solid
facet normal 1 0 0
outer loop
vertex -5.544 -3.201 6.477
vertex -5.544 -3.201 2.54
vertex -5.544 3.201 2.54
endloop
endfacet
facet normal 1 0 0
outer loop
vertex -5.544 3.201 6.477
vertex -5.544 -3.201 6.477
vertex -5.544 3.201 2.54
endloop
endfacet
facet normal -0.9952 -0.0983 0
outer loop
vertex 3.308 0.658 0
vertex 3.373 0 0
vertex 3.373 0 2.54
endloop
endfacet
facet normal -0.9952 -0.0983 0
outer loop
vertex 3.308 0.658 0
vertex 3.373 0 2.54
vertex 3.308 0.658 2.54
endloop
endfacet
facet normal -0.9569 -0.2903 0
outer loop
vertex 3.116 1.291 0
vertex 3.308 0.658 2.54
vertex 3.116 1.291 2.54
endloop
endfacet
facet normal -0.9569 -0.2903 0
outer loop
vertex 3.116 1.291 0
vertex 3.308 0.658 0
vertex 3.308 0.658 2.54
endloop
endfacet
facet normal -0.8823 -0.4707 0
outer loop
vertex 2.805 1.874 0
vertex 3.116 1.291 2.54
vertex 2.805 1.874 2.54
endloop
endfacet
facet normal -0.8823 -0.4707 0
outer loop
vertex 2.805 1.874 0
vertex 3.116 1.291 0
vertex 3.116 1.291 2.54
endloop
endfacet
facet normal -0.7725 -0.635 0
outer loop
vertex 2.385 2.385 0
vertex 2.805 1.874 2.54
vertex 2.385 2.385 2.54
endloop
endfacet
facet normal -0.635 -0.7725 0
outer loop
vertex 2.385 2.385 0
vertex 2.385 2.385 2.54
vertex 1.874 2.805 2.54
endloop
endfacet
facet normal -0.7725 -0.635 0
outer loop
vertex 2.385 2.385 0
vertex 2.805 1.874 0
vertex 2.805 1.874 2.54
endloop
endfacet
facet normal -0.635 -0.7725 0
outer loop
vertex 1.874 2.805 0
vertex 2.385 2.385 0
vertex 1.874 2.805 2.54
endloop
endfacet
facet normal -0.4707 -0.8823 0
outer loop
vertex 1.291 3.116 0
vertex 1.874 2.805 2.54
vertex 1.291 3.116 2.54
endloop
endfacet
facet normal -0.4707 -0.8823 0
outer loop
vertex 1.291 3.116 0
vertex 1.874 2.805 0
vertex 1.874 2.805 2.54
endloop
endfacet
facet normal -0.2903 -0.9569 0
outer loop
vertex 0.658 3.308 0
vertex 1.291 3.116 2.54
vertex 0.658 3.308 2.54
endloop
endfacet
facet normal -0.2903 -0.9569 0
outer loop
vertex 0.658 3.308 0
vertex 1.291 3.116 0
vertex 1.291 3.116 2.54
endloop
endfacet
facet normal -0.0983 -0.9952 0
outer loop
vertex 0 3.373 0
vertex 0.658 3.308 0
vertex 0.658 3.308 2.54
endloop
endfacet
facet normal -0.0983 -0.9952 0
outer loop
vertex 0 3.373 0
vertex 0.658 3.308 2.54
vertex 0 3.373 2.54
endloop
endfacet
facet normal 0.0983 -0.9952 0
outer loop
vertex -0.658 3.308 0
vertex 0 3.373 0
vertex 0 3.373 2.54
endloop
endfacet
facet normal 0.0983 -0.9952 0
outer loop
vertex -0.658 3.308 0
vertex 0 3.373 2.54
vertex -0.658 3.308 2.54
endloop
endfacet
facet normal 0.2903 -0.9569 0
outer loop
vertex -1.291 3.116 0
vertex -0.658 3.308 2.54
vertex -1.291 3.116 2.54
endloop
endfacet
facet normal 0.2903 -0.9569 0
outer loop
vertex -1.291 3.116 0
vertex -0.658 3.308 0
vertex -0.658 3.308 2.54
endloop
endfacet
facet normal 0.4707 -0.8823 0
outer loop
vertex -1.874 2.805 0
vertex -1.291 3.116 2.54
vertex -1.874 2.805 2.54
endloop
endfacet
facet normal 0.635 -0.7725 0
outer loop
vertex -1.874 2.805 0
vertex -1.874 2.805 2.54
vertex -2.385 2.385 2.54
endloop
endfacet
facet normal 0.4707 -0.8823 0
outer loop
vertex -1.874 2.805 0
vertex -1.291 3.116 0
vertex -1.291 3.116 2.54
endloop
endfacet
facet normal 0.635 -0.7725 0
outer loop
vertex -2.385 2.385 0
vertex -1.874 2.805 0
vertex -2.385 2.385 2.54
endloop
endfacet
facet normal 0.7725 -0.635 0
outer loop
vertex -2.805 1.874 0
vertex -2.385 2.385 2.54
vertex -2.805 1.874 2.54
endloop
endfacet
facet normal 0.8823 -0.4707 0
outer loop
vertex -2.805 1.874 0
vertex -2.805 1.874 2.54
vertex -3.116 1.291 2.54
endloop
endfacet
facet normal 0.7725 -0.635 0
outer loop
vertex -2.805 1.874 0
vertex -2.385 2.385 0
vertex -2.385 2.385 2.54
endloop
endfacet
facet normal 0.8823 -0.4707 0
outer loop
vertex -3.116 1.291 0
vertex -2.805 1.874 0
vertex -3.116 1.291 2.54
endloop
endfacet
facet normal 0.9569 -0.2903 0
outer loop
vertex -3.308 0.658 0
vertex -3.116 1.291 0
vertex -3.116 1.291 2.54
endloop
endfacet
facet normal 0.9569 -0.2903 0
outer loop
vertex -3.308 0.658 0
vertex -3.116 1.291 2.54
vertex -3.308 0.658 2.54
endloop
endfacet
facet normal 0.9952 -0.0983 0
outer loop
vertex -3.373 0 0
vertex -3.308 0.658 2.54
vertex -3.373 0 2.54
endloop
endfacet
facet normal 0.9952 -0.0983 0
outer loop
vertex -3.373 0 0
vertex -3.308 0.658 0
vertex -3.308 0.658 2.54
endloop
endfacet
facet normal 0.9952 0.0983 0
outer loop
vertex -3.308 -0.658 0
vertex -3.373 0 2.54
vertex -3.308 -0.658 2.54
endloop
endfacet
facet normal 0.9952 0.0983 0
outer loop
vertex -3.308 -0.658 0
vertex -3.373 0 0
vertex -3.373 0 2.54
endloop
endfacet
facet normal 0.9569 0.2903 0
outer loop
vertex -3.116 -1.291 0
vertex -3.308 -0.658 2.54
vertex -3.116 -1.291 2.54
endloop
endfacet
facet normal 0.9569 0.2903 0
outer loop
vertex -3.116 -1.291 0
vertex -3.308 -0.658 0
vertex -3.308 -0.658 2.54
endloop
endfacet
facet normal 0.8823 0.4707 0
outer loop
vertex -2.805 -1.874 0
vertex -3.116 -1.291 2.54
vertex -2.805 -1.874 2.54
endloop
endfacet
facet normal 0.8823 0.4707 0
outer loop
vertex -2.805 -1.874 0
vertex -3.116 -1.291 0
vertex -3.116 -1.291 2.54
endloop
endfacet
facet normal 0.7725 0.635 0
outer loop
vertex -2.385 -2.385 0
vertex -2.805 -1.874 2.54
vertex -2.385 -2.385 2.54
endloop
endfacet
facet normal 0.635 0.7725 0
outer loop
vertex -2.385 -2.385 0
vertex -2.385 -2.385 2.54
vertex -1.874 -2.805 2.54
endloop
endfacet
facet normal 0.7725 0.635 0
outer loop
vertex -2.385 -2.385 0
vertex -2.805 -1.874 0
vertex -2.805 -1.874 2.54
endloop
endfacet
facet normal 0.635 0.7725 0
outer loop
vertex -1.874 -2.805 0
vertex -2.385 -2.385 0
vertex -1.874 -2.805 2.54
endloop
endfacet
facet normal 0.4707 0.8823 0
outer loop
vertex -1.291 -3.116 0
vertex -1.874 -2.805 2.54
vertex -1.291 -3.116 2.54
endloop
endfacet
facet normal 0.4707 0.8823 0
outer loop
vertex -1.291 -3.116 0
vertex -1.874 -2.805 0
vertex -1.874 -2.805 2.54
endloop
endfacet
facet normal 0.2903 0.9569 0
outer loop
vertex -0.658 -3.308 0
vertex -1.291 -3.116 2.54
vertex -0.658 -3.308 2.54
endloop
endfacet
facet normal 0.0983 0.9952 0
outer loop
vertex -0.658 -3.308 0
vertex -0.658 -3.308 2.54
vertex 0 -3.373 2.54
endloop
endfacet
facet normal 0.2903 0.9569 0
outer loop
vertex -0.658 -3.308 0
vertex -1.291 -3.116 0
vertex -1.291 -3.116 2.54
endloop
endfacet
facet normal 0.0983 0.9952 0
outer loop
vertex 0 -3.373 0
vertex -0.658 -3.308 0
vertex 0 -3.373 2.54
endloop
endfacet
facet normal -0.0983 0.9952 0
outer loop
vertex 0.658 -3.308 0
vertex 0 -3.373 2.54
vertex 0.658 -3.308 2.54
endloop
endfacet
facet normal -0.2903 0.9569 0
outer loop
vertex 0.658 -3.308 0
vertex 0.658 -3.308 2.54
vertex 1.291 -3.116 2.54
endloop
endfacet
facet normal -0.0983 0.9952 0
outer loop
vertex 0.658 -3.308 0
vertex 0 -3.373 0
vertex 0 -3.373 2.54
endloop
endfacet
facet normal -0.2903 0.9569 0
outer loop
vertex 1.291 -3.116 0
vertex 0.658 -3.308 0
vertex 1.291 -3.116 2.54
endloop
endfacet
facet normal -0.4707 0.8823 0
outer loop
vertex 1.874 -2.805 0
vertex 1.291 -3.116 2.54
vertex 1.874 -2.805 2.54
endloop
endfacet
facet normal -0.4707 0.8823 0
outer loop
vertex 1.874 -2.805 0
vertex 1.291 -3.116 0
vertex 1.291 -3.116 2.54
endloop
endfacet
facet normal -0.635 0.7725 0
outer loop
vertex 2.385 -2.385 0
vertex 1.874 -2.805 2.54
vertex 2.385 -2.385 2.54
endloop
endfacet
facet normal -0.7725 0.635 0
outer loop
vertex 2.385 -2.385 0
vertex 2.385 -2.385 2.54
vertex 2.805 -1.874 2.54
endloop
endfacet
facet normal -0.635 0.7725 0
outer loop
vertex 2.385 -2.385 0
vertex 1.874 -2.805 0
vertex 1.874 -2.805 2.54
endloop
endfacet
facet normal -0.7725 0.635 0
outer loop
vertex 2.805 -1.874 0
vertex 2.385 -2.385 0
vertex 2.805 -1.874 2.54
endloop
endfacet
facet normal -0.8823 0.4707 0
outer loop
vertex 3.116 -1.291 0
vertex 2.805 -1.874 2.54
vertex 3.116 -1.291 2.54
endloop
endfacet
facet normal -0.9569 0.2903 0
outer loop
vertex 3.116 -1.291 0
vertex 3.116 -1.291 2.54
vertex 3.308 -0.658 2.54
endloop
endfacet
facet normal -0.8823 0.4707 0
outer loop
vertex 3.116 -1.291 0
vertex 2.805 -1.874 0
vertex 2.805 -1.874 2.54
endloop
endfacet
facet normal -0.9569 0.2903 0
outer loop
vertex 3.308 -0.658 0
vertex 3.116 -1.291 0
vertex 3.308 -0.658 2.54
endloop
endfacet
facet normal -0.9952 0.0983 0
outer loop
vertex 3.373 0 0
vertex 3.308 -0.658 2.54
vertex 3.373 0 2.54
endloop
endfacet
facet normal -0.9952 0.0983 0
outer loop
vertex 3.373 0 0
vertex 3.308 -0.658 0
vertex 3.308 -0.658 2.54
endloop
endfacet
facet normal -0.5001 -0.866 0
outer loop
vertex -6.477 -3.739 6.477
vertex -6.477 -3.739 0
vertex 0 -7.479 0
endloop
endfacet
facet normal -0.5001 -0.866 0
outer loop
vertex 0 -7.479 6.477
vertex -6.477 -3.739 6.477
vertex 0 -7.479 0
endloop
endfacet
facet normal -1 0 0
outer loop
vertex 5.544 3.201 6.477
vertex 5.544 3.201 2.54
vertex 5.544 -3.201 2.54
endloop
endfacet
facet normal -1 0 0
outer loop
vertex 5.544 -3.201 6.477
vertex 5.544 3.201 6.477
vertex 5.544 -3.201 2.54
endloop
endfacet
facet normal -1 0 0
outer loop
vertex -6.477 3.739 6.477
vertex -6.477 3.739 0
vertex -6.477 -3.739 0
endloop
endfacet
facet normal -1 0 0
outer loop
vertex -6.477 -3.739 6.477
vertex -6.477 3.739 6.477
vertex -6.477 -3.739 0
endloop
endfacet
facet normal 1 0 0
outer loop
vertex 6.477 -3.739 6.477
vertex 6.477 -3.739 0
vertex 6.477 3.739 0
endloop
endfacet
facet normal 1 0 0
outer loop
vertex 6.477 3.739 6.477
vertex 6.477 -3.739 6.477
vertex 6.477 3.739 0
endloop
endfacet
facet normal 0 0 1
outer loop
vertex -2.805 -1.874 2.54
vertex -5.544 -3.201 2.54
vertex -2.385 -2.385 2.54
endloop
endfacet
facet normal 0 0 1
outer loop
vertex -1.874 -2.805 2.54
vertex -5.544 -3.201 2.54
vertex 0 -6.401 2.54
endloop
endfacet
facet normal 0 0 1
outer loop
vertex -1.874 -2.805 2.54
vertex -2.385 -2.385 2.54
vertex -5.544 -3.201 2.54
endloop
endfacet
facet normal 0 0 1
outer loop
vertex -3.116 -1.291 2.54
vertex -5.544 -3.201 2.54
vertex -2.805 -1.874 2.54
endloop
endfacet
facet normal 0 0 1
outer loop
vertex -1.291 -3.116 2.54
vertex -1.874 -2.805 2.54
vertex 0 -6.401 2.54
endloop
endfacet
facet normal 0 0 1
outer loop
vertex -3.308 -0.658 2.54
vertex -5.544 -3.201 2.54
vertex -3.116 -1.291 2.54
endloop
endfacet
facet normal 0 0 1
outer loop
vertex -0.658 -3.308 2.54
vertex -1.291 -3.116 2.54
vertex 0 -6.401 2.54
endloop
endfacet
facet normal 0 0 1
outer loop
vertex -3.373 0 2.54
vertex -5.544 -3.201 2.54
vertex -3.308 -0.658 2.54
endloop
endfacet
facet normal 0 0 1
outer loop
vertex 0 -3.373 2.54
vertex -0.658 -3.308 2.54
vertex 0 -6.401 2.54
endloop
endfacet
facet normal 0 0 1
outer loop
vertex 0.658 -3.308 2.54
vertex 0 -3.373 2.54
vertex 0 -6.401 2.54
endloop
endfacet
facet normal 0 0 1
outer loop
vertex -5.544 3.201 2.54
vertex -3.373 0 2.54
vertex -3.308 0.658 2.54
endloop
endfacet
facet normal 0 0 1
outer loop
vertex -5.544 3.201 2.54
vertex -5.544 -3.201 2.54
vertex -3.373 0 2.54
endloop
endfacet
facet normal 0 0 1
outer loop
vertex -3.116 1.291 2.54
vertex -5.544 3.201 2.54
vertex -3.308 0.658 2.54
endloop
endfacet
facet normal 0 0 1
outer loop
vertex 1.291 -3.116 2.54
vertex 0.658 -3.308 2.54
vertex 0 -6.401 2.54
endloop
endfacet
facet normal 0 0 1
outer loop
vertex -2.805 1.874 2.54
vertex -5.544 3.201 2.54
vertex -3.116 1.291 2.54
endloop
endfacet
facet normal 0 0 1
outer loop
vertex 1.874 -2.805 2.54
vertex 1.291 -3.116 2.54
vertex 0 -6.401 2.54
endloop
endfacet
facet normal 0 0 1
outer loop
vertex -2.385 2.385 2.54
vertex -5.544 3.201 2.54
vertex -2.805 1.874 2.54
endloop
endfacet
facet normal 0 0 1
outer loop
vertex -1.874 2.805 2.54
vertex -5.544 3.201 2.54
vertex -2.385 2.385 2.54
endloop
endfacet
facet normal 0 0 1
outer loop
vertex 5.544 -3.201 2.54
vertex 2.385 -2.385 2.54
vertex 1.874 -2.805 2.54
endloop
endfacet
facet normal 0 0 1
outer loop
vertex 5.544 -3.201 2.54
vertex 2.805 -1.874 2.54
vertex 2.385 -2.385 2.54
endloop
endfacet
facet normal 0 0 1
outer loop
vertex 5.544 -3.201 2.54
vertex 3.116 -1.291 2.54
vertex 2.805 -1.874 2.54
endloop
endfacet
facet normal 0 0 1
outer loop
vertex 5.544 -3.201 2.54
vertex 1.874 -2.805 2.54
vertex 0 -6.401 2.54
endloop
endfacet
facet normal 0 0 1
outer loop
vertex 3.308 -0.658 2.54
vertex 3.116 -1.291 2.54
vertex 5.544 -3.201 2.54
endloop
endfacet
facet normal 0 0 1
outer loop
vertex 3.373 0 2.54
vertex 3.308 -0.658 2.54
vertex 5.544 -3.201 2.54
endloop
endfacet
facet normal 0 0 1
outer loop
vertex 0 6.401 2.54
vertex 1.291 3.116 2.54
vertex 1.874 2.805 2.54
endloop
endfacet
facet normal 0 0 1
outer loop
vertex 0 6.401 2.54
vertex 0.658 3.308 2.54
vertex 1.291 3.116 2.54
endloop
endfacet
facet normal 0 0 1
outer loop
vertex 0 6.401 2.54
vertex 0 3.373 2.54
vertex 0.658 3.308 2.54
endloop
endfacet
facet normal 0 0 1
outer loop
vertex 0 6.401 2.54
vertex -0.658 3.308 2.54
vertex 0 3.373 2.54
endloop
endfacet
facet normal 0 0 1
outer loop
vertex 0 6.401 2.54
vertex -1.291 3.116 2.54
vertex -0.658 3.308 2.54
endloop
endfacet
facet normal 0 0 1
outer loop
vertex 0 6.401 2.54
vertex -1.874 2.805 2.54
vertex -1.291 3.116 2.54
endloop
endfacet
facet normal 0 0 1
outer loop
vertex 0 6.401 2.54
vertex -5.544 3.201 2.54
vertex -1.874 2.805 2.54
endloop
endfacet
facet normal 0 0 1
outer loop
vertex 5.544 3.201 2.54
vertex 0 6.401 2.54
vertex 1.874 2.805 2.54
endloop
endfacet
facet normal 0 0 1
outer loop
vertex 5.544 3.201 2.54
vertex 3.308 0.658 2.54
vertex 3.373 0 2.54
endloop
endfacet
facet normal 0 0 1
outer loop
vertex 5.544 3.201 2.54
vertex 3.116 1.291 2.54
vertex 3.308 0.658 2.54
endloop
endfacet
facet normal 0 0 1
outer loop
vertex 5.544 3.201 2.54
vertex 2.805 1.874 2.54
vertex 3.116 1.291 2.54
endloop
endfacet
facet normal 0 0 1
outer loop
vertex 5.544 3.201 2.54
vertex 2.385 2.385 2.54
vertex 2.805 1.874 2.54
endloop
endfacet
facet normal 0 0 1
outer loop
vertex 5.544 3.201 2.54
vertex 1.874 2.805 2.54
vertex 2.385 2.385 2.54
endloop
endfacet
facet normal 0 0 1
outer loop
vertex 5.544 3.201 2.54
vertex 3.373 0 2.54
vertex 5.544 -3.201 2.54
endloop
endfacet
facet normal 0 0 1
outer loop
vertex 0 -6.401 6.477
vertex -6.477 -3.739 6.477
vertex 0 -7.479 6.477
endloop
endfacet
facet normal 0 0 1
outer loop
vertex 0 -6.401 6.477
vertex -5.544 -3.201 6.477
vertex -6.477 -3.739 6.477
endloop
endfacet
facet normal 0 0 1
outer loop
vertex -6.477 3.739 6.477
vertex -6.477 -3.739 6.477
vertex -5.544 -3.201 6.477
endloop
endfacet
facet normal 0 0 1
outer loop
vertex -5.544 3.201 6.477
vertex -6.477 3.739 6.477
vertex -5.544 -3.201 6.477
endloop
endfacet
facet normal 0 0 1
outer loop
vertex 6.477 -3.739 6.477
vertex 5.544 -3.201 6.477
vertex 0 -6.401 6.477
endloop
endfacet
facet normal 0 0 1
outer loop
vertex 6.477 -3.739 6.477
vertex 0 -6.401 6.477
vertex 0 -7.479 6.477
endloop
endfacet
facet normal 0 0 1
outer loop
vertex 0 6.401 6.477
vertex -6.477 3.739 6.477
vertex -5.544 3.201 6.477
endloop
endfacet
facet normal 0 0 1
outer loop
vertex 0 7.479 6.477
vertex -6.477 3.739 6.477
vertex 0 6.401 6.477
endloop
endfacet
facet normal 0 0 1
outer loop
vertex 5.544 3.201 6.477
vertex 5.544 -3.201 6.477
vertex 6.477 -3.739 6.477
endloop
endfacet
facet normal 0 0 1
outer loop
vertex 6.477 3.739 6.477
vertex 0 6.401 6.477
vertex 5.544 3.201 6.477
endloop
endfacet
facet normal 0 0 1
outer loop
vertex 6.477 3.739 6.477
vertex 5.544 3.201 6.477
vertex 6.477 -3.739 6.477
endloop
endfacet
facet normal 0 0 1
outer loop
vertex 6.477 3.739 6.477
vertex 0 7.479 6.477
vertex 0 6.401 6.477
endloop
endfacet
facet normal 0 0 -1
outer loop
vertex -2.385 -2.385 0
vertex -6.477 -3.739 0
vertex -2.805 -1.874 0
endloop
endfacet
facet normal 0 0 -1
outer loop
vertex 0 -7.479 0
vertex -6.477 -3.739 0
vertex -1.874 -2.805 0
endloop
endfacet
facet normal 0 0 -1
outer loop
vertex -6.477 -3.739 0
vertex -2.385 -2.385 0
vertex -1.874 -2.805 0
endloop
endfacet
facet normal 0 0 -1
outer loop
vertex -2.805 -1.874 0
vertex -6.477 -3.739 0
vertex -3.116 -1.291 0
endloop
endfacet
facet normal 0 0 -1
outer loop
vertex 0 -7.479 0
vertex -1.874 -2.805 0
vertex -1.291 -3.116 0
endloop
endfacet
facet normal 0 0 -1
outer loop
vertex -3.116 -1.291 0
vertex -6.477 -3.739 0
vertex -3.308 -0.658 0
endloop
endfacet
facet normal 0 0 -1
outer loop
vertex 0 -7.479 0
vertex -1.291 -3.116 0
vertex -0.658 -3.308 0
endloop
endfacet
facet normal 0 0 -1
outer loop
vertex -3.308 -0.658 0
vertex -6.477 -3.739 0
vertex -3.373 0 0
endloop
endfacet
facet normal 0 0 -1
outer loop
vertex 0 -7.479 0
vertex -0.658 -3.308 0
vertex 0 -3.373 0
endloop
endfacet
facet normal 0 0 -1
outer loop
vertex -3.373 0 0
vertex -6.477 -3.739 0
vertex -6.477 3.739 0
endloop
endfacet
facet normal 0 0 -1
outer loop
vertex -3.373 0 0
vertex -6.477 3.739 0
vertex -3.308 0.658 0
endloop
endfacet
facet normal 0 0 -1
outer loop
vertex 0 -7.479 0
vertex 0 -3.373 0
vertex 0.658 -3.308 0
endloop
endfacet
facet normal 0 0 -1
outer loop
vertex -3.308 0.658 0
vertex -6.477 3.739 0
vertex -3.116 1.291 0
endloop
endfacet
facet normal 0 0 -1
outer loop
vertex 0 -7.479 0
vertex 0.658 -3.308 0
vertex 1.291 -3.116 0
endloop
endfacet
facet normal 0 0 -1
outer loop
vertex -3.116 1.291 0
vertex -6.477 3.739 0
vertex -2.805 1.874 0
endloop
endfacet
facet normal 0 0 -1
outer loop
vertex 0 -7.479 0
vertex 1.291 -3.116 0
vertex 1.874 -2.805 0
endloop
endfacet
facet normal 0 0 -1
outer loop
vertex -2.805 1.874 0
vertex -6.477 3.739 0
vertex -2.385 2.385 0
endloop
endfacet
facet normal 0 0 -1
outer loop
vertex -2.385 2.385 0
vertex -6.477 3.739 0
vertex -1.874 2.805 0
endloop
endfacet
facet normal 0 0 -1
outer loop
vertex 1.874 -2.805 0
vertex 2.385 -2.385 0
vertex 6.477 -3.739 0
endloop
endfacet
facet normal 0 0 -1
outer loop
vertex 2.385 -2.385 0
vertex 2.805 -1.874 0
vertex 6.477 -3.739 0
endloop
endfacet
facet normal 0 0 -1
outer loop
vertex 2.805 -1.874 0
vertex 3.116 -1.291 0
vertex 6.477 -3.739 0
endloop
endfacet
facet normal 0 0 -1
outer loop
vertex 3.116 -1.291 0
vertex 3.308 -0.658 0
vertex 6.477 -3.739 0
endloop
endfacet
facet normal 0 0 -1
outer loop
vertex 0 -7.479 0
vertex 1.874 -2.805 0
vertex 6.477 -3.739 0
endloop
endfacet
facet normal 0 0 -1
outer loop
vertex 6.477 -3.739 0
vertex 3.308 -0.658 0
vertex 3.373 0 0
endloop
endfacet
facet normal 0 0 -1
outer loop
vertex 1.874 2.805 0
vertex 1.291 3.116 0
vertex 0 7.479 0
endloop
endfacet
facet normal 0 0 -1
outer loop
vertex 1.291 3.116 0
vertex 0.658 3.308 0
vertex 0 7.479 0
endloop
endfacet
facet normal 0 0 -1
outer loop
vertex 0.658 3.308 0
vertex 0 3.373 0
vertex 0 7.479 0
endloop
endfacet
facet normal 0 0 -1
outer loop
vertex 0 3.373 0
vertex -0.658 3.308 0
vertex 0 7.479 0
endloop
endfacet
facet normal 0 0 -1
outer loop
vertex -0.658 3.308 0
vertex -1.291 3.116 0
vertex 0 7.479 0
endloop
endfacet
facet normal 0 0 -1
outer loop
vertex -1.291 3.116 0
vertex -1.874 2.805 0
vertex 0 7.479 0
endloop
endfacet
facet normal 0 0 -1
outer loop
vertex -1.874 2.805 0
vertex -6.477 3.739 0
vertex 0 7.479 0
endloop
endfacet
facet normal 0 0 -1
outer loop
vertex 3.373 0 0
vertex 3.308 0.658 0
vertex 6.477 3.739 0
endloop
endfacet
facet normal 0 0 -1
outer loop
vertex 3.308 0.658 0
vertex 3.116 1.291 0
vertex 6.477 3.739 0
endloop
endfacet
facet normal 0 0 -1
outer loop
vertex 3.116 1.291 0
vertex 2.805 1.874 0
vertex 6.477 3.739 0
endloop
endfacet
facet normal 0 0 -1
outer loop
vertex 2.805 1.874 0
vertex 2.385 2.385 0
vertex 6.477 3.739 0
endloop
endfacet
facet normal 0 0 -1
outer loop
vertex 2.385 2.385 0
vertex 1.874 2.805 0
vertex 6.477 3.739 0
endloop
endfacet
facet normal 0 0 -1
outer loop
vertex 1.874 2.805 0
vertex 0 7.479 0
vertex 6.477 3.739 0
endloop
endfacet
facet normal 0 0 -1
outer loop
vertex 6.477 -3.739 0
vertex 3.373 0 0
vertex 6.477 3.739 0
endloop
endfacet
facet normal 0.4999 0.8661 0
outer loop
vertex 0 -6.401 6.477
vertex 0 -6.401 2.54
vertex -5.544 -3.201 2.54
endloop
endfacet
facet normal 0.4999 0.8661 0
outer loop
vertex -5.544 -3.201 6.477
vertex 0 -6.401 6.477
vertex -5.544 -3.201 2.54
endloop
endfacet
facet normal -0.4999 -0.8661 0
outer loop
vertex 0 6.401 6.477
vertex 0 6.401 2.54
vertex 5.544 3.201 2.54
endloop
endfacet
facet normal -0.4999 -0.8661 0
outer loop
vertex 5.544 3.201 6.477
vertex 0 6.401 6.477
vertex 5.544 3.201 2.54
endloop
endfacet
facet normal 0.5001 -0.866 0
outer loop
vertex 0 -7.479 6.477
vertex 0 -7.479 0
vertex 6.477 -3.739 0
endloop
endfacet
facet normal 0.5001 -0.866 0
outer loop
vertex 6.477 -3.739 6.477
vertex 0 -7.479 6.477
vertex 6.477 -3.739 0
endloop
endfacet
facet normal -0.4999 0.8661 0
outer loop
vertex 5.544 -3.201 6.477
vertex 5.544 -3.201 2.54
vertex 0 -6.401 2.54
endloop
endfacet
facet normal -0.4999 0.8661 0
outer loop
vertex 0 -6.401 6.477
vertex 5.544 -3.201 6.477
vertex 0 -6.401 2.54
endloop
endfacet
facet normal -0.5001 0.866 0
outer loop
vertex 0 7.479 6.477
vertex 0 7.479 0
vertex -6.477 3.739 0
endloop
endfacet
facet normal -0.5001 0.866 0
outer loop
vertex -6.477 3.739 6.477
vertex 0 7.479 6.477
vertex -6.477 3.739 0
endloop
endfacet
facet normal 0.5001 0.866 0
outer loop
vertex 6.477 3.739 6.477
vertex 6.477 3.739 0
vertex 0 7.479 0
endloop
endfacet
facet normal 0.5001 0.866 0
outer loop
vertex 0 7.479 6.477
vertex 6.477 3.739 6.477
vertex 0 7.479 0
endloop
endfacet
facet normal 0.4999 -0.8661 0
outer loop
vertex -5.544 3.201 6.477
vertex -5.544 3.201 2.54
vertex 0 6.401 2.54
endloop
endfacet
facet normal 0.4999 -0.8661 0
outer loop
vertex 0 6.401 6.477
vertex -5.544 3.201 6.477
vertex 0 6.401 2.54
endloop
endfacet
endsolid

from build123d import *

# Parameters (mm, degrees)
F0_R     = 3.37312
F1_DEPTH = 2.54
F2_DEPTH = 6.477


with BuildPart() as f1:
    # F0 (on Top) → F1 (new body)
    with BuildSketch(Plane.XY):
        Polygon((5.54355, -3.20057), (5.54355, 3.20057), (0, 6.40114), (-5.54355, 3.20057), (-5.54355, -3.20057), (0, -6.40114), align=None)
        Circle(F0_R, mode=Mode.SUBTRACT)
    extrude(amount=F1_DEPTH)

    # F0 (on Top) → F2 (join)
    with BuildSketch(Plane.XY):
        Polygon((6.477, -3.739498), (6.477, 3.739498), (0, 7.478995), (-6.477, 3.739498), (-6.477, -3.739498), (0, -7.478995), align=None)
        Polygon((0, 6.40114), (5.54355, 3.20057), (5.54355, -3.20057), (0, -6.40114), (-5.54355, -3.20057), (-5.54355, 3.20057), align=None, mode=Mode.SUBTRACT)
    extrude(amount=F2_DEPTH)


solid = f1.part
